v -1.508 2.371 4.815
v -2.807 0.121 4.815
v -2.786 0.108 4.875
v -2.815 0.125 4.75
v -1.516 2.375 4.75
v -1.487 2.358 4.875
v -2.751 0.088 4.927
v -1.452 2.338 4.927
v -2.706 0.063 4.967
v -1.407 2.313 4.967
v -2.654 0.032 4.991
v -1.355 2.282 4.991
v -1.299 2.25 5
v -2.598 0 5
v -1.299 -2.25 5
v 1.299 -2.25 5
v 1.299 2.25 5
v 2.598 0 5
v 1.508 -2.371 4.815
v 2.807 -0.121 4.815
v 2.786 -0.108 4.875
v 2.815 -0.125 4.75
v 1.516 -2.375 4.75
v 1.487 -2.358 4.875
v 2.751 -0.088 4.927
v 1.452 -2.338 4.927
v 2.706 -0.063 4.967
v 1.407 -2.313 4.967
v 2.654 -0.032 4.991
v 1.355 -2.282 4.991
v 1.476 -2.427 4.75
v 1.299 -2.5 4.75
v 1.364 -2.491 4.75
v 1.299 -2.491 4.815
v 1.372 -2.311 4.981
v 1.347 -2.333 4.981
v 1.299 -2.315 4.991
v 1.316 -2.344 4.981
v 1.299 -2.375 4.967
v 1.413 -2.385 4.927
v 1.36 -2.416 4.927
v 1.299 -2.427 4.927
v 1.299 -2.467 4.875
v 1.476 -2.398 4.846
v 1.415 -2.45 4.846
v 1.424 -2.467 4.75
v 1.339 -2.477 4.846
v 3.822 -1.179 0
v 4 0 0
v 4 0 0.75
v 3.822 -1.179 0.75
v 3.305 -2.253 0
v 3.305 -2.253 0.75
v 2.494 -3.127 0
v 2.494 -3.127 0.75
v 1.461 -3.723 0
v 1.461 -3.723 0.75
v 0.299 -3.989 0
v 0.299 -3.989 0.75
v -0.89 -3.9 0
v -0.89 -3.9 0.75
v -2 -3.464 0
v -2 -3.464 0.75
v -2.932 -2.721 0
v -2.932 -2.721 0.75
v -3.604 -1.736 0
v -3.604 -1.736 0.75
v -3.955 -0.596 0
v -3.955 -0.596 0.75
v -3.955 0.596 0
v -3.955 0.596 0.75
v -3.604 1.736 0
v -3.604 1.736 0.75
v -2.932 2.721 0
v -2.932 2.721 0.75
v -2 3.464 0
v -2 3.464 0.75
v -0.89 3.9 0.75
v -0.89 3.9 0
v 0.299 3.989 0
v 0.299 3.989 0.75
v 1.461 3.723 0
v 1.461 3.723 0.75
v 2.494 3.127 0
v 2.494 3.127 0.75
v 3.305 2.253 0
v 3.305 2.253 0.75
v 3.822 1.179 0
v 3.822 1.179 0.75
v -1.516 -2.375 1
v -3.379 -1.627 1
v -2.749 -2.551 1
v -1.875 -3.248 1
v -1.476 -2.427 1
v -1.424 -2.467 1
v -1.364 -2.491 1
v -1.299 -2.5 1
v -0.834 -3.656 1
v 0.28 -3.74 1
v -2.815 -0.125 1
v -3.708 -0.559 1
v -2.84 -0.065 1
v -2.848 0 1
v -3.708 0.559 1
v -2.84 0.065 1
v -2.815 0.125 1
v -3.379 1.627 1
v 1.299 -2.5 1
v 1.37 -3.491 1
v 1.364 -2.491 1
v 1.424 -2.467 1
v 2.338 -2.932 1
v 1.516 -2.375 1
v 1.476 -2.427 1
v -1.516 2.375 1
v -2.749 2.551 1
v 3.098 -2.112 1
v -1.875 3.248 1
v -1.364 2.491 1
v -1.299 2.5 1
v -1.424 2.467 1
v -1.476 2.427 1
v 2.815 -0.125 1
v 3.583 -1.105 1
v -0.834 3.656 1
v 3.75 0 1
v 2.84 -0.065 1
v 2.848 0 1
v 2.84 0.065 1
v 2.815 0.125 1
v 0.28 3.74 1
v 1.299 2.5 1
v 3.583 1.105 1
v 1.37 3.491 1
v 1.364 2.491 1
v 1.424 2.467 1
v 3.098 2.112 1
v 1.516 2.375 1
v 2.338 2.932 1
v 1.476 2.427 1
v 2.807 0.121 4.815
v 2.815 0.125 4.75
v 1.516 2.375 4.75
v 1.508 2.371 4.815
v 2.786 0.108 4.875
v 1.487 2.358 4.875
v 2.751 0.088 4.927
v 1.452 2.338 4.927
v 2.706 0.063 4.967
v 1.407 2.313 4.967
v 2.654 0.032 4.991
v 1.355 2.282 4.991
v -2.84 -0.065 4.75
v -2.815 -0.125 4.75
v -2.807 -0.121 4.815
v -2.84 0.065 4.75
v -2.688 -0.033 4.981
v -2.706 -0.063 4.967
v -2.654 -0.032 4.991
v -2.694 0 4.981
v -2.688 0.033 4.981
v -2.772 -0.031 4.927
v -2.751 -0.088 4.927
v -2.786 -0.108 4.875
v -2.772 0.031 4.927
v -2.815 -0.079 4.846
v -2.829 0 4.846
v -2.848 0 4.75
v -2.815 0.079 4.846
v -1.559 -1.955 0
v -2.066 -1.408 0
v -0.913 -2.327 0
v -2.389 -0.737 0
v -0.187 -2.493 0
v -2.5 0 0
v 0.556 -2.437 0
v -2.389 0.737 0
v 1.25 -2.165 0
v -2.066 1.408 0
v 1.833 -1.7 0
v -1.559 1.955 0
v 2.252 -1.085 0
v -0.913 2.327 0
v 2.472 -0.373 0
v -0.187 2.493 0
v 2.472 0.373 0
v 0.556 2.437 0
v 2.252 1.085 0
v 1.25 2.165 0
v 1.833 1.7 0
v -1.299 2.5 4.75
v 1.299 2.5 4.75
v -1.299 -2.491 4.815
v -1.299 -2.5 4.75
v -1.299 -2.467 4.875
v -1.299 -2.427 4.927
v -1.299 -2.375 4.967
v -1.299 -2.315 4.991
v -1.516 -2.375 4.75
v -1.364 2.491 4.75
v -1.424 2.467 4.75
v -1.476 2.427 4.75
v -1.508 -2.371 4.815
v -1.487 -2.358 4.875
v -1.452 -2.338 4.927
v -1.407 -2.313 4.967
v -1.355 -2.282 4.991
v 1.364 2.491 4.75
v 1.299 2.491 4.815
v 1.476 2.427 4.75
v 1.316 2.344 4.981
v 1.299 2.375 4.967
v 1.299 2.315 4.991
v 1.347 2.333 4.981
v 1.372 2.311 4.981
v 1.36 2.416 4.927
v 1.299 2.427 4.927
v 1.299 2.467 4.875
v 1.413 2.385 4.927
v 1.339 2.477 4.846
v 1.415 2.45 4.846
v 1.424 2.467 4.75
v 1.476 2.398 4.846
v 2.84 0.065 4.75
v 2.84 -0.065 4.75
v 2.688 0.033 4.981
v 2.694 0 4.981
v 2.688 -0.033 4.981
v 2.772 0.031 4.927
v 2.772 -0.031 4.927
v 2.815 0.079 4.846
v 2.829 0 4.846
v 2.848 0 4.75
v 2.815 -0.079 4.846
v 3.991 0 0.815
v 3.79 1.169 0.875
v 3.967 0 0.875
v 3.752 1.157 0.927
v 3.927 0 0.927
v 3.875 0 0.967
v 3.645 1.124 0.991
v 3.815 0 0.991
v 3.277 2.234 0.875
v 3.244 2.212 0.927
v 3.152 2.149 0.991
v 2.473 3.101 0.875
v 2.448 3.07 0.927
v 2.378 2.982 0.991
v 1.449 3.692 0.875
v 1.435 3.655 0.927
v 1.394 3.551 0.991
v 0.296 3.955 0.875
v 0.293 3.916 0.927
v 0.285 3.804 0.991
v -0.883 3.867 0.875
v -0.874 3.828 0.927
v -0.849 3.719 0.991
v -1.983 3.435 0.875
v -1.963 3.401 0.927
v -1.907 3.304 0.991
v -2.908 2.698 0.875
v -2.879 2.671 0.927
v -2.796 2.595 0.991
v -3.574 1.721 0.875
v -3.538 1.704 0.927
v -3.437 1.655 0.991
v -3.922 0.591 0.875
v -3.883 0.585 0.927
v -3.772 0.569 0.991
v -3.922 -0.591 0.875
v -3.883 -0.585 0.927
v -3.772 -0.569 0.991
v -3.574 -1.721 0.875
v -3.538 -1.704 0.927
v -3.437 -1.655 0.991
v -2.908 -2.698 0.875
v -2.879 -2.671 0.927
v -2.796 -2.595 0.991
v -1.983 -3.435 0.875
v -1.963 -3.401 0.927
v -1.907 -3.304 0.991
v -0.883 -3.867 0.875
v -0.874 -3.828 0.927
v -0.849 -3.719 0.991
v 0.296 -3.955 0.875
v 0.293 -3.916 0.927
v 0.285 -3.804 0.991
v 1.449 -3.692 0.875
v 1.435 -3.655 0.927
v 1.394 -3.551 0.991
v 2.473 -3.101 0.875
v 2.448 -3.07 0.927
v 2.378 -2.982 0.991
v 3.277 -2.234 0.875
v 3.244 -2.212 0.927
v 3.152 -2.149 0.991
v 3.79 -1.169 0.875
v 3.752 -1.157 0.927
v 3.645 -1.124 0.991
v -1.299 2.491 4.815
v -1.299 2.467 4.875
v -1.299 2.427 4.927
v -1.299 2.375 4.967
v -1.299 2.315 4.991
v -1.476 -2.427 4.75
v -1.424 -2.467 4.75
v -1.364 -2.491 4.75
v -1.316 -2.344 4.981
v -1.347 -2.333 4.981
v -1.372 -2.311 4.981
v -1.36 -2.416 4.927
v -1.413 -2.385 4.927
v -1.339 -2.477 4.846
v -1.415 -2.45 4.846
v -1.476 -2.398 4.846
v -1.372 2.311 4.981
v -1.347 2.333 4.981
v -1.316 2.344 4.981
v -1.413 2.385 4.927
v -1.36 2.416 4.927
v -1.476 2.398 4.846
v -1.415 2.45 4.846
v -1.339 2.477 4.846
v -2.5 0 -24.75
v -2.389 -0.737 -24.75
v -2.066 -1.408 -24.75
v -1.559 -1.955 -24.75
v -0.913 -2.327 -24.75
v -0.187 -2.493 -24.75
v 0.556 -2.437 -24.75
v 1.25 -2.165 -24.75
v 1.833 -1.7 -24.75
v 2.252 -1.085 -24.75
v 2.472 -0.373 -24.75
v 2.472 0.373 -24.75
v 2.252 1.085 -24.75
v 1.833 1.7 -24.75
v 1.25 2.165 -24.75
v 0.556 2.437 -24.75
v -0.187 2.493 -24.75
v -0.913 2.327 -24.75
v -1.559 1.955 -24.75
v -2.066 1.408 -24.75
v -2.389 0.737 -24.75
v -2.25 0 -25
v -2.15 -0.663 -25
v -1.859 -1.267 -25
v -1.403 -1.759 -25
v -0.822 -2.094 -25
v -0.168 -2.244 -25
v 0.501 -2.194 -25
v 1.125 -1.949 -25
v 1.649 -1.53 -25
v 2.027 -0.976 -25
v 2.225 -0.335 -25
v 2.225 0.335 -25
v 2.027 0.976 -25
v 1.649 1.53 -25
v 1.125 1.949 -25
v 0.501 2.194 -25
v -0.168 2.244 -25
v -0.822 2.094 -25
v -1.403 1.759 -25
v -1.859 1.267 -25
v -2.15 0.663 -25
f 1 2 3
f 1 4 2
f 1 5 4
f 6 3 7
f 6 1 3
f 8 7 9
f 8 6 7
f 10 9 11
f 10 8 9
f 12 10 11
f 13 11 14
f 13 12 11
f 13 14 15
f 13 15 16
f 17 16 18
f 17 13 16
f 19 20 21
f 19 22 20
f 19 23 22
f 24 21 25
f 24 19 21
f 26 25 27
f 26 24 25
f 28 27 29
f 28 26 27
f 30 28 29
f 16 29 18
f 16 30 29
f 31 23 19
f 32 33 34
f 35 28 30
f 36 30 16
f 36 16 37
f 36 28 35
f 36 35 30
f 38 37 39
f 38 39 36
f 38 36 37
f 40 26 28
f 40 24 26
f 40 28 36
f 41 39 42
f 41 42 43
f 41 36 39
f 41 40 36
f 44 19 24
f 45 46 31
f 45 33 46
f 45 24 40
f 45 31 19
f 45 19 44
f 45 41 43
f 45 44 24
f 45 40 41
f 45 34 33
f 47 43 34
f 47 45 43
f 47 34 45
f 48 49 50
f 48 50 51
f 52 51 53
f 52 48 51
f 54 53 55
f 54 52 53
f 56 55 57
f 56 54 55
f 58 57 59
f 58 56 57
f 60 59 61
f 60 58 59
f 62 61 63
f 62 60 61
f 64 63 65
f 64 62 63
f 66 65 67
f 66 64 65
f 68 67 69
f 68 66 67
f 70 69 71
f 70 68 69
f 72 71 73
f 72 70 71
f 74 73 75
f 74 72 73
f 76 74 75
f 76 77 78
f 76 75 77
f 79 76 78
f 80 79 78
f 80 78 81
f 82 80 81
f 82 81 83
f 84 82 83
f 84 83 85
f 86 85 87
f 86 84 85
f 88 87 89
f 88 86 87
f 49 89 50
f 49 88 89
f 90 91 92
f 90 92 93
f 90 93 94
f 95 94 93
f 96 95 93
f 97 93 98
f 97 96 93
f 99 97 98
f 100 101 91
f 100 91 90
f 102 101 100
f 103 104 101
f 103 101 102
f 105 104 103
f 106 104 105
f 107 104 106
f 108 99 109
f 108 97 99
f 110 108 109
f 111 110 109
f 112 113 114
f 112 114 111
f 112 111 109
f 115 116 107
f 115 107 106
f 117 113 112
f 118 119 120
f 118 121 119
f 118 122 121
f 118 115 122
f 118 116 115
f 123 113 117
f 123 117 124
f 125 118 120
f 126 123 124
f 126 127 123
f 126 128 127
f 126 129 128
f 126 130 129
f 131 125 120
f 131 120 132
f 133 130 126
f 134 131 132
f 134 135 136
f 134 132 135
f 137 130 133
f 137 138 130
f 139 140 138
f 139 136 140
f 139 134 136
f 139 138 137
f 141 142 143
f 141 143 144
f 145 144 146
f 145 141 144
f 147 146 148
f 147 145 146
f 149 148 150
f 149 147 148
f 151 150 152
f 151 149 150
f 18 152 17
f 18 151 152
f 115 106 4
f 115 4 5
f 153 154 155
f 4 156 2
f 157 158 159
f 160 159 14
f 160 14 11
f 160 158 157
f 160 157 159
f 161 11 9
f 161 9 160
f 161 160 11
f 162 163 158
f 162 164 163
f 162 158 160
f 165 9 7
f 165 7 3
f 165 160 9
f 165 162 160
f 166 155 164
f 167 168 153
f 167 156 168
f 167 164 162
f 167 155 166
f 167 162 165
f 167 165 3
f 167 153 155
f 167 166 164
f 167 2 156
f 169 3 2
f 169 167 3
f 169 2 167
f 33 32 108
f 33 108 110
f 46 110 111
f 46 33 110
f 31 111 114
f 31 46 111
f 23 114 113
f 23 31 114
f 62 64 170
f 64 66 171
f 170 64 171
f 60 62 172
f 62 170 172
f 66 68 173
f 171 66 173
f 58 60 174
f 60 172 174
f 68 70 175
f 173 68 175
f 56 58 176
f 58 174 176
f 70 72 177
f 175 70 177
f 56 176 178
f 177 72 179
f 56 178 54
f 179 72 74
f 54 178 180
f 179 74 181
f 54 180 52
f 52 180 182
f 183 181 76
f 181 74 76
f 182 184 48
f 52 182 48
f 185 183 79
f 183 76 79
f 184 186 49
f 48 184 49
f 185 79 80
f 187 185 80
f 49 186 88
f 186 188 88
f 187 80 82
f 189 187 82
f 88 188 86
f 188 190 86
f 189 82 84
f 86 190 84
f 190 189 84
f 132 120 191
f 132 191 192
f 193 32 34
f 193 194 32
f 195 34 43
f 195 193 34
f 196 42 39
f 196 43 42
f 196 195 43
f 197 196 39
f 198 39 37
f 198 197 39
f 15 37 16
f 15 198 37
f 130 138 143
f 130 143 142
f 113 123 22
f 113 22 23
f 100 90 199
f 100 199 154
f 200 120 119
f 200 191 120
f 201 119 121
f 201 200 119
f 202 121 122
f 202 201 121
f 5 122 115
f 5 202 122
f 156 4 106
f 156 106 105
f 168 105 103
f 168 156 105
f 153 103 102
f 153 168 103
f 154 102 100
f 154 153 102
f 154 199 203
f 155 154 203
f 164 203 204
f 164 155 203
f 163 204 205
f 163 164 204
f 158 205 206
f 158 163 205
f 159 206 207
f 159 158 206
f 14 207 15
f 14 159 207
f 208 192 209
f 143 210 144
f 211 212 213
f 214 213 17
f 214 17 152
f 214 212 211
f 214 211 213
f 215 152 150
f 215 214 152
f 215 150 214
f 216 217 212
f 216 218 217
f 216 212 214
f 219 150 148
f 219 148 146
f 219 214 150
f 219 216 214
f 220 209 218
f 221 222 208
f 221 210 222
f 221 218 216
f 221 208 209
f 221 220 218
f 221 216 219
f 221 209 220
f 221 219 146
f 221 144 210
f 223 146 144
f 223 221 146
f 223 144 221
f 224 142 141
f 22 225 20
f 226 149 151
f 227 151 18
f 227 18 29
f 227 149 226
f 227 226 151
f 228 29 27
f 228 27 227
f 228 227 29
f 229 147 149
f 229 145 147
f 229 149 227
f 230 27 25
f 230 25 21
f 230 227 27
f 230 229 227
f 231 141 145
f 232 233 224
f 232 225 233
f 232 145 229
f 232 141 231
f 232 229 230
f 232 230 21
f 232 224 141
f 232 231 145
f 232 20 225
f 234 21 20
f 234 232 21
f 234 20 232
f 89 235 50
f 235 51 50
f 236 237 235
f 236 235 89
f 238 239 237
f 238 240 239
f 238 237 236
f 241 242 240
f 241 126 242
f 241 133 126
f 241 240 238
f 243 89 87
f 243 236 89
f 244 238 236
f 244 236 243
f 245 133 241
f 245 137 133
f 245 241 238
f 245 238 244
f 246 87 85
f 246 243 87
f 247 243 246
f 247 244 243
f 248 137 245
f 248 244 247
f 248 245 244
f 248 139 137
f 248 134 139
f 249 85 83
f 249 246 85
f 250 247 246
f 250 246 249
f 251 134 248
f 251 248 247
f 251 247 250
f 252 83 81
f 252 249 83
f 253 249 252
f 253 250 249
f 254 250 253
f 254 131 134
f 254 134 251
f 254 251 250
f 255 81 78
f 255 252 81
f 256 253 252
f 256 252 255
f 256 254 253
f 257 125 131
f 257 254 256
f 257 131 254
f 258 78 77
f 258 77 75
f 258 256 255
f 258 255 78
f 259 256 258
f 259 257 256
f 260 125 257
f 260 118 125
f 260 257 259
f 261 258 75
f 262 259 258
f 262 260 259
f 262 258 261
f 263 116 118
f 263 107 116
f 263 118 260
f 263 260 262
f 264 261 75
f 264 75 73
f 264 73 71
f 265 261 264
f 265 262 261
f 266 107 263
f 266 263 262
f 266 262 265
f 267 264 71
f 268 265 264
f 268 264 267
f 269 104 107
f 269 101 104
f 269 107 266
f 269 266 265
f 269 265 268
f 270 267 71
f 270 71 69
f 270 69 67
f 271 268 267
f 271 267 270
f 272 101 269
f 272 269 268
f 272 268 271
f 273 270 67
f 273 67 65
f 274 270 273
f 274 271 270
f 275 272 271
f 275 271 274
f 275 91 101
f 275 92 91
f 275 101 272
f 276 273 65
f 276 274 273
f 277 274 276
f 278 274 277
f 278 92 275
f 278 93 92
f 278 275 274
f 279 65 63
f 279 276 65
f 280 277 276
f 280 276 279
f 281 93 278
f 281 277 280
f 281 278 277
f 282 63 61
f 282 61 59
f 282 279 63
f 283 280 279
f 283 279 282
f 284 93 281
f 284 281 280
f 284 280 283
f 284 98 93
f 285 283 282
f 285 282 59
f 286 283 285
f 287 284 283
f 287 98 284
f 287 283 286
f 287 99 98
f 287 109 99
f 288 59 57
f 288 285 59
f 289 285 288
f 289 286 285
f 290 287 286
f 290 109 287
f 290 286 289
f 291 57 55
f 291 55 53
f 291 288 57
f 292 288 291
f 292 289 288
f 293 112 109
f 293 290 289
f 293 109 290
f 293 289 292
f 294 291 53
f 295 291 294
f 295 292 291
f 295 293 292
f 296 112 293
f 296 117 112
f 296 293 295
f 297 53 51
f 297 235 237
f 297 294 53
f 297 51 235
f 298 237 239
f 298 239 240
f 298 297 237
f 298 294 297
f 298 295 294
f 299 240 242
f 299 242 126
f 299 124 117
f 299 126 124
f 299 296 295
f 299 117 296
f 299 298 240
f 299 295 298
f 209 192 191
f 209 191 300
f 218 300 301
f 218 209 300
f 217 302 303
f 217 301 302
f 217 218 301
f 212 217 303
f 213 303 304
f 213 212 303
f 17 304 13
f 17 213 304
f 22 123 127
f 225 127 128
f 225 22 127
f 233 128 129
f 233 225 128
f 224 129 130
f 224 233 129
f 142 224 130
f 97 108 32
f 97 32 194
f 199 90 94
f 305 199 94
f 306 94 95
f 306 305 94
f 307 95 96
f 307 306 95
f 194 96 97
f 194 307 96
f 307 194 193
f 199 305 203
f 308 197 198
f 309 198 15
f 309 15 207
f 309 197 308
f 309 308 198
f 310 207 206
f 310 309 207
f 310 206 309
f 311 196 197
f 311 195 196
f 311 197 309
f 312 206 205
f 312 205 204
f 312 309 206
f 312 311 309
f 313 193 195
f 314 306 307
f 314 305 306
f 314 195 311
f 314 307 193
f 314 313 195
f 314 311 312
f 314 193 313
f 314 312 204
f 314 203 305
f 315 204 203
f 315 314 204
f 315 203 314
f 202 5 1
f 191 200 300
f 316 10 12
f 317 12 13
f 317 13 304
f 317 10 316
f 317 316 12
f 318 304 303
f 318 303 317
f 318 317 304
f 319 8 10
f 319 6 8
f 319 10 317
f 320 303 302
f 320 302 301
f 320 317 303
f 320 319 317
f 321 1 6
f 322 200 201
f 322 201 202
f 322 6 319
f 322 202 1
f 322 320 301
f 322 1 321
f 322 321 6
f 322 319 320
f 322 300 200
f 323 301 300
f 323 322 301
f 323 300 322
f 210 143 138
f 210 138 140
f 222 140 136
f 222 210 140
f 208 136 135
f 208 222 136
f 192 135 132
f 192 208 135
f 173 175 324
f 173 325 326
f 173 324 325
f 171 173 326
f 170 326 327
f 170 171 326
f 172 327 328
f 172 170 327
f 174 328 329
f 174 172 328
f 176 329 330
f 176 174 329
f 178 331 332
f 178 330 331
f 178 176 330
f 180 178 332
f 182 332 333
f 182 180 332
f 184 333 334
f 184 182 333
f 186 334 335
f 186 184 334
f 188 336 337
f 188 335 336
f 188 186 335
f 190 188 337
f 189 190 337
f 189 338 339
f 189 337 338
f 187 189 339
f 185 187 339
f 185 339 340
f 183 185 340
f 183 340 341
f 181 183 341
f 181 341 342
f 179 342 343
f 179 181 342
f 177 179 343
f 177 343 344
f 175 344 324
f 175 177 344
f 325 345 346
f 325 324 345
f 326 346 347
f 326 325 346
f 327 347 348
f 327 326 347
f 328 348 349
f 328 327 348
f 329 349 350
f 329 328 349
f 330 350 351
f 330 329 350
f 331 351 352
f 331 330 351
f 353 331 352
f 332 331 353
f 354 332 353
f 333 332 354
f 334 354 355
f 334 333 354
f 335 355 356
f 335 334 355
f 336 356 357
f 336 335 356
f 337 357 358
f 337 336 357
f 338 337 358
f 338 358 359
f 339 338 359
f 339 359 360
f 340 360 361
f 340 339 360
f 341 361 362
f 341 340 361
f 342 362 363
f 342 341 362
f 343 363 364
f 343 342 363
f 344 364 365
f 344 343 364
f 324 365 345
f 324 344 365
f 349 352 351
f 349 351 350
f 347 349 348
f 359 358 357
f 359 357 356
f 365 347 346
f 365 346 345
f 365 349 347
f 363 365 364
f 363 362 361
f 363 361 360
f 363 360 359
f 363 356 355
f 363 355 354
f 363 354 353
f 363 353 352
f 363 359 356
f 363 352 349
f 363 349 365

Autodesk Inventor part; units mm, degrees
ref_plane "YZ Plane" through (0, 0, 0) normal (1, 0, 0) x (0, 1, 0)
ref_plane "XZ Plane" through (0, 0, 0) normal (0, 1, 0) x (-1, 0, 0)
ref_plane "XY Plane" through (0, 0, 0) normal (0, 0, 1) x (1, 0, 0)
sketch "草图1" plane through (0, 0, 0) normal (0, 0, 1) x (1, 0, 0)
  circle A0 centre (0, 0) radius 4
  dimension "d0" = 8
extrude "拉伸1" add sketch "草图1" along normal blind 1
sketch "草图2" plane through (0, 0, 1) normal (0, 0, 1) x (1, 0, 0)
  line L0 (1.4434, -2.5) -> (-1.4434, -2.5)
  line L1 (-1.4434, -2.5) -> (-2.8868, 0)
  line L2 (-2.8868, 0) -> (-1.4434, 2.5)
  line L3 (-1.4434, 2.5) -> (1.4434, 2.5)
  line L4 (1.4434, 2.5) -> (2.8868, 0)
  line L5 (2.8868, 0) -> (1.4434, -2.5)
  line L6 (0, 0) -> (0, 1.5067)
  point P0 (0, 2.5)
  dimension "d3" = 1.5067
  dimension "d4" = 5
extrude "拉伸2" add sketch "草图2" along normal blind 4
sketch "草图3" plane through (0, 0, 0) normal (0, 0, -1) x (-1, 0, 0)
  circle A0 centre (0, 0) radius 2.5
  dimension "d7" = 5
extrude "拉伸3" add sketch "草图3" along normal blind 25
thread "螺纹1" size "M5x0.8" class "6g" standard "ANSI Metric M Profile" length 6
chamfer "倒角1" distance 0.25 angle 45 1 edges at (2.5, 0, -25)
fillet "圆角1" radius 0.25 13 edges at (-4, 0, 1) (0, 2.5, 5) (2.1651, 1.25, 5) (2.1651, -1.25, 5) (0, -2.5, 5) (-2.1651, -1.25, 5) (-2.1651, 1.25, 5) (1.4434, 2.5, 3) (2.8868, 0, 3) (1.4434, -2.5, 3) (-1.4434, -2.5, 3) (-2.8868, 0, 3) (-1.4434, 2.5, 3)
properties part number "刀夹片紧固螺丝"
